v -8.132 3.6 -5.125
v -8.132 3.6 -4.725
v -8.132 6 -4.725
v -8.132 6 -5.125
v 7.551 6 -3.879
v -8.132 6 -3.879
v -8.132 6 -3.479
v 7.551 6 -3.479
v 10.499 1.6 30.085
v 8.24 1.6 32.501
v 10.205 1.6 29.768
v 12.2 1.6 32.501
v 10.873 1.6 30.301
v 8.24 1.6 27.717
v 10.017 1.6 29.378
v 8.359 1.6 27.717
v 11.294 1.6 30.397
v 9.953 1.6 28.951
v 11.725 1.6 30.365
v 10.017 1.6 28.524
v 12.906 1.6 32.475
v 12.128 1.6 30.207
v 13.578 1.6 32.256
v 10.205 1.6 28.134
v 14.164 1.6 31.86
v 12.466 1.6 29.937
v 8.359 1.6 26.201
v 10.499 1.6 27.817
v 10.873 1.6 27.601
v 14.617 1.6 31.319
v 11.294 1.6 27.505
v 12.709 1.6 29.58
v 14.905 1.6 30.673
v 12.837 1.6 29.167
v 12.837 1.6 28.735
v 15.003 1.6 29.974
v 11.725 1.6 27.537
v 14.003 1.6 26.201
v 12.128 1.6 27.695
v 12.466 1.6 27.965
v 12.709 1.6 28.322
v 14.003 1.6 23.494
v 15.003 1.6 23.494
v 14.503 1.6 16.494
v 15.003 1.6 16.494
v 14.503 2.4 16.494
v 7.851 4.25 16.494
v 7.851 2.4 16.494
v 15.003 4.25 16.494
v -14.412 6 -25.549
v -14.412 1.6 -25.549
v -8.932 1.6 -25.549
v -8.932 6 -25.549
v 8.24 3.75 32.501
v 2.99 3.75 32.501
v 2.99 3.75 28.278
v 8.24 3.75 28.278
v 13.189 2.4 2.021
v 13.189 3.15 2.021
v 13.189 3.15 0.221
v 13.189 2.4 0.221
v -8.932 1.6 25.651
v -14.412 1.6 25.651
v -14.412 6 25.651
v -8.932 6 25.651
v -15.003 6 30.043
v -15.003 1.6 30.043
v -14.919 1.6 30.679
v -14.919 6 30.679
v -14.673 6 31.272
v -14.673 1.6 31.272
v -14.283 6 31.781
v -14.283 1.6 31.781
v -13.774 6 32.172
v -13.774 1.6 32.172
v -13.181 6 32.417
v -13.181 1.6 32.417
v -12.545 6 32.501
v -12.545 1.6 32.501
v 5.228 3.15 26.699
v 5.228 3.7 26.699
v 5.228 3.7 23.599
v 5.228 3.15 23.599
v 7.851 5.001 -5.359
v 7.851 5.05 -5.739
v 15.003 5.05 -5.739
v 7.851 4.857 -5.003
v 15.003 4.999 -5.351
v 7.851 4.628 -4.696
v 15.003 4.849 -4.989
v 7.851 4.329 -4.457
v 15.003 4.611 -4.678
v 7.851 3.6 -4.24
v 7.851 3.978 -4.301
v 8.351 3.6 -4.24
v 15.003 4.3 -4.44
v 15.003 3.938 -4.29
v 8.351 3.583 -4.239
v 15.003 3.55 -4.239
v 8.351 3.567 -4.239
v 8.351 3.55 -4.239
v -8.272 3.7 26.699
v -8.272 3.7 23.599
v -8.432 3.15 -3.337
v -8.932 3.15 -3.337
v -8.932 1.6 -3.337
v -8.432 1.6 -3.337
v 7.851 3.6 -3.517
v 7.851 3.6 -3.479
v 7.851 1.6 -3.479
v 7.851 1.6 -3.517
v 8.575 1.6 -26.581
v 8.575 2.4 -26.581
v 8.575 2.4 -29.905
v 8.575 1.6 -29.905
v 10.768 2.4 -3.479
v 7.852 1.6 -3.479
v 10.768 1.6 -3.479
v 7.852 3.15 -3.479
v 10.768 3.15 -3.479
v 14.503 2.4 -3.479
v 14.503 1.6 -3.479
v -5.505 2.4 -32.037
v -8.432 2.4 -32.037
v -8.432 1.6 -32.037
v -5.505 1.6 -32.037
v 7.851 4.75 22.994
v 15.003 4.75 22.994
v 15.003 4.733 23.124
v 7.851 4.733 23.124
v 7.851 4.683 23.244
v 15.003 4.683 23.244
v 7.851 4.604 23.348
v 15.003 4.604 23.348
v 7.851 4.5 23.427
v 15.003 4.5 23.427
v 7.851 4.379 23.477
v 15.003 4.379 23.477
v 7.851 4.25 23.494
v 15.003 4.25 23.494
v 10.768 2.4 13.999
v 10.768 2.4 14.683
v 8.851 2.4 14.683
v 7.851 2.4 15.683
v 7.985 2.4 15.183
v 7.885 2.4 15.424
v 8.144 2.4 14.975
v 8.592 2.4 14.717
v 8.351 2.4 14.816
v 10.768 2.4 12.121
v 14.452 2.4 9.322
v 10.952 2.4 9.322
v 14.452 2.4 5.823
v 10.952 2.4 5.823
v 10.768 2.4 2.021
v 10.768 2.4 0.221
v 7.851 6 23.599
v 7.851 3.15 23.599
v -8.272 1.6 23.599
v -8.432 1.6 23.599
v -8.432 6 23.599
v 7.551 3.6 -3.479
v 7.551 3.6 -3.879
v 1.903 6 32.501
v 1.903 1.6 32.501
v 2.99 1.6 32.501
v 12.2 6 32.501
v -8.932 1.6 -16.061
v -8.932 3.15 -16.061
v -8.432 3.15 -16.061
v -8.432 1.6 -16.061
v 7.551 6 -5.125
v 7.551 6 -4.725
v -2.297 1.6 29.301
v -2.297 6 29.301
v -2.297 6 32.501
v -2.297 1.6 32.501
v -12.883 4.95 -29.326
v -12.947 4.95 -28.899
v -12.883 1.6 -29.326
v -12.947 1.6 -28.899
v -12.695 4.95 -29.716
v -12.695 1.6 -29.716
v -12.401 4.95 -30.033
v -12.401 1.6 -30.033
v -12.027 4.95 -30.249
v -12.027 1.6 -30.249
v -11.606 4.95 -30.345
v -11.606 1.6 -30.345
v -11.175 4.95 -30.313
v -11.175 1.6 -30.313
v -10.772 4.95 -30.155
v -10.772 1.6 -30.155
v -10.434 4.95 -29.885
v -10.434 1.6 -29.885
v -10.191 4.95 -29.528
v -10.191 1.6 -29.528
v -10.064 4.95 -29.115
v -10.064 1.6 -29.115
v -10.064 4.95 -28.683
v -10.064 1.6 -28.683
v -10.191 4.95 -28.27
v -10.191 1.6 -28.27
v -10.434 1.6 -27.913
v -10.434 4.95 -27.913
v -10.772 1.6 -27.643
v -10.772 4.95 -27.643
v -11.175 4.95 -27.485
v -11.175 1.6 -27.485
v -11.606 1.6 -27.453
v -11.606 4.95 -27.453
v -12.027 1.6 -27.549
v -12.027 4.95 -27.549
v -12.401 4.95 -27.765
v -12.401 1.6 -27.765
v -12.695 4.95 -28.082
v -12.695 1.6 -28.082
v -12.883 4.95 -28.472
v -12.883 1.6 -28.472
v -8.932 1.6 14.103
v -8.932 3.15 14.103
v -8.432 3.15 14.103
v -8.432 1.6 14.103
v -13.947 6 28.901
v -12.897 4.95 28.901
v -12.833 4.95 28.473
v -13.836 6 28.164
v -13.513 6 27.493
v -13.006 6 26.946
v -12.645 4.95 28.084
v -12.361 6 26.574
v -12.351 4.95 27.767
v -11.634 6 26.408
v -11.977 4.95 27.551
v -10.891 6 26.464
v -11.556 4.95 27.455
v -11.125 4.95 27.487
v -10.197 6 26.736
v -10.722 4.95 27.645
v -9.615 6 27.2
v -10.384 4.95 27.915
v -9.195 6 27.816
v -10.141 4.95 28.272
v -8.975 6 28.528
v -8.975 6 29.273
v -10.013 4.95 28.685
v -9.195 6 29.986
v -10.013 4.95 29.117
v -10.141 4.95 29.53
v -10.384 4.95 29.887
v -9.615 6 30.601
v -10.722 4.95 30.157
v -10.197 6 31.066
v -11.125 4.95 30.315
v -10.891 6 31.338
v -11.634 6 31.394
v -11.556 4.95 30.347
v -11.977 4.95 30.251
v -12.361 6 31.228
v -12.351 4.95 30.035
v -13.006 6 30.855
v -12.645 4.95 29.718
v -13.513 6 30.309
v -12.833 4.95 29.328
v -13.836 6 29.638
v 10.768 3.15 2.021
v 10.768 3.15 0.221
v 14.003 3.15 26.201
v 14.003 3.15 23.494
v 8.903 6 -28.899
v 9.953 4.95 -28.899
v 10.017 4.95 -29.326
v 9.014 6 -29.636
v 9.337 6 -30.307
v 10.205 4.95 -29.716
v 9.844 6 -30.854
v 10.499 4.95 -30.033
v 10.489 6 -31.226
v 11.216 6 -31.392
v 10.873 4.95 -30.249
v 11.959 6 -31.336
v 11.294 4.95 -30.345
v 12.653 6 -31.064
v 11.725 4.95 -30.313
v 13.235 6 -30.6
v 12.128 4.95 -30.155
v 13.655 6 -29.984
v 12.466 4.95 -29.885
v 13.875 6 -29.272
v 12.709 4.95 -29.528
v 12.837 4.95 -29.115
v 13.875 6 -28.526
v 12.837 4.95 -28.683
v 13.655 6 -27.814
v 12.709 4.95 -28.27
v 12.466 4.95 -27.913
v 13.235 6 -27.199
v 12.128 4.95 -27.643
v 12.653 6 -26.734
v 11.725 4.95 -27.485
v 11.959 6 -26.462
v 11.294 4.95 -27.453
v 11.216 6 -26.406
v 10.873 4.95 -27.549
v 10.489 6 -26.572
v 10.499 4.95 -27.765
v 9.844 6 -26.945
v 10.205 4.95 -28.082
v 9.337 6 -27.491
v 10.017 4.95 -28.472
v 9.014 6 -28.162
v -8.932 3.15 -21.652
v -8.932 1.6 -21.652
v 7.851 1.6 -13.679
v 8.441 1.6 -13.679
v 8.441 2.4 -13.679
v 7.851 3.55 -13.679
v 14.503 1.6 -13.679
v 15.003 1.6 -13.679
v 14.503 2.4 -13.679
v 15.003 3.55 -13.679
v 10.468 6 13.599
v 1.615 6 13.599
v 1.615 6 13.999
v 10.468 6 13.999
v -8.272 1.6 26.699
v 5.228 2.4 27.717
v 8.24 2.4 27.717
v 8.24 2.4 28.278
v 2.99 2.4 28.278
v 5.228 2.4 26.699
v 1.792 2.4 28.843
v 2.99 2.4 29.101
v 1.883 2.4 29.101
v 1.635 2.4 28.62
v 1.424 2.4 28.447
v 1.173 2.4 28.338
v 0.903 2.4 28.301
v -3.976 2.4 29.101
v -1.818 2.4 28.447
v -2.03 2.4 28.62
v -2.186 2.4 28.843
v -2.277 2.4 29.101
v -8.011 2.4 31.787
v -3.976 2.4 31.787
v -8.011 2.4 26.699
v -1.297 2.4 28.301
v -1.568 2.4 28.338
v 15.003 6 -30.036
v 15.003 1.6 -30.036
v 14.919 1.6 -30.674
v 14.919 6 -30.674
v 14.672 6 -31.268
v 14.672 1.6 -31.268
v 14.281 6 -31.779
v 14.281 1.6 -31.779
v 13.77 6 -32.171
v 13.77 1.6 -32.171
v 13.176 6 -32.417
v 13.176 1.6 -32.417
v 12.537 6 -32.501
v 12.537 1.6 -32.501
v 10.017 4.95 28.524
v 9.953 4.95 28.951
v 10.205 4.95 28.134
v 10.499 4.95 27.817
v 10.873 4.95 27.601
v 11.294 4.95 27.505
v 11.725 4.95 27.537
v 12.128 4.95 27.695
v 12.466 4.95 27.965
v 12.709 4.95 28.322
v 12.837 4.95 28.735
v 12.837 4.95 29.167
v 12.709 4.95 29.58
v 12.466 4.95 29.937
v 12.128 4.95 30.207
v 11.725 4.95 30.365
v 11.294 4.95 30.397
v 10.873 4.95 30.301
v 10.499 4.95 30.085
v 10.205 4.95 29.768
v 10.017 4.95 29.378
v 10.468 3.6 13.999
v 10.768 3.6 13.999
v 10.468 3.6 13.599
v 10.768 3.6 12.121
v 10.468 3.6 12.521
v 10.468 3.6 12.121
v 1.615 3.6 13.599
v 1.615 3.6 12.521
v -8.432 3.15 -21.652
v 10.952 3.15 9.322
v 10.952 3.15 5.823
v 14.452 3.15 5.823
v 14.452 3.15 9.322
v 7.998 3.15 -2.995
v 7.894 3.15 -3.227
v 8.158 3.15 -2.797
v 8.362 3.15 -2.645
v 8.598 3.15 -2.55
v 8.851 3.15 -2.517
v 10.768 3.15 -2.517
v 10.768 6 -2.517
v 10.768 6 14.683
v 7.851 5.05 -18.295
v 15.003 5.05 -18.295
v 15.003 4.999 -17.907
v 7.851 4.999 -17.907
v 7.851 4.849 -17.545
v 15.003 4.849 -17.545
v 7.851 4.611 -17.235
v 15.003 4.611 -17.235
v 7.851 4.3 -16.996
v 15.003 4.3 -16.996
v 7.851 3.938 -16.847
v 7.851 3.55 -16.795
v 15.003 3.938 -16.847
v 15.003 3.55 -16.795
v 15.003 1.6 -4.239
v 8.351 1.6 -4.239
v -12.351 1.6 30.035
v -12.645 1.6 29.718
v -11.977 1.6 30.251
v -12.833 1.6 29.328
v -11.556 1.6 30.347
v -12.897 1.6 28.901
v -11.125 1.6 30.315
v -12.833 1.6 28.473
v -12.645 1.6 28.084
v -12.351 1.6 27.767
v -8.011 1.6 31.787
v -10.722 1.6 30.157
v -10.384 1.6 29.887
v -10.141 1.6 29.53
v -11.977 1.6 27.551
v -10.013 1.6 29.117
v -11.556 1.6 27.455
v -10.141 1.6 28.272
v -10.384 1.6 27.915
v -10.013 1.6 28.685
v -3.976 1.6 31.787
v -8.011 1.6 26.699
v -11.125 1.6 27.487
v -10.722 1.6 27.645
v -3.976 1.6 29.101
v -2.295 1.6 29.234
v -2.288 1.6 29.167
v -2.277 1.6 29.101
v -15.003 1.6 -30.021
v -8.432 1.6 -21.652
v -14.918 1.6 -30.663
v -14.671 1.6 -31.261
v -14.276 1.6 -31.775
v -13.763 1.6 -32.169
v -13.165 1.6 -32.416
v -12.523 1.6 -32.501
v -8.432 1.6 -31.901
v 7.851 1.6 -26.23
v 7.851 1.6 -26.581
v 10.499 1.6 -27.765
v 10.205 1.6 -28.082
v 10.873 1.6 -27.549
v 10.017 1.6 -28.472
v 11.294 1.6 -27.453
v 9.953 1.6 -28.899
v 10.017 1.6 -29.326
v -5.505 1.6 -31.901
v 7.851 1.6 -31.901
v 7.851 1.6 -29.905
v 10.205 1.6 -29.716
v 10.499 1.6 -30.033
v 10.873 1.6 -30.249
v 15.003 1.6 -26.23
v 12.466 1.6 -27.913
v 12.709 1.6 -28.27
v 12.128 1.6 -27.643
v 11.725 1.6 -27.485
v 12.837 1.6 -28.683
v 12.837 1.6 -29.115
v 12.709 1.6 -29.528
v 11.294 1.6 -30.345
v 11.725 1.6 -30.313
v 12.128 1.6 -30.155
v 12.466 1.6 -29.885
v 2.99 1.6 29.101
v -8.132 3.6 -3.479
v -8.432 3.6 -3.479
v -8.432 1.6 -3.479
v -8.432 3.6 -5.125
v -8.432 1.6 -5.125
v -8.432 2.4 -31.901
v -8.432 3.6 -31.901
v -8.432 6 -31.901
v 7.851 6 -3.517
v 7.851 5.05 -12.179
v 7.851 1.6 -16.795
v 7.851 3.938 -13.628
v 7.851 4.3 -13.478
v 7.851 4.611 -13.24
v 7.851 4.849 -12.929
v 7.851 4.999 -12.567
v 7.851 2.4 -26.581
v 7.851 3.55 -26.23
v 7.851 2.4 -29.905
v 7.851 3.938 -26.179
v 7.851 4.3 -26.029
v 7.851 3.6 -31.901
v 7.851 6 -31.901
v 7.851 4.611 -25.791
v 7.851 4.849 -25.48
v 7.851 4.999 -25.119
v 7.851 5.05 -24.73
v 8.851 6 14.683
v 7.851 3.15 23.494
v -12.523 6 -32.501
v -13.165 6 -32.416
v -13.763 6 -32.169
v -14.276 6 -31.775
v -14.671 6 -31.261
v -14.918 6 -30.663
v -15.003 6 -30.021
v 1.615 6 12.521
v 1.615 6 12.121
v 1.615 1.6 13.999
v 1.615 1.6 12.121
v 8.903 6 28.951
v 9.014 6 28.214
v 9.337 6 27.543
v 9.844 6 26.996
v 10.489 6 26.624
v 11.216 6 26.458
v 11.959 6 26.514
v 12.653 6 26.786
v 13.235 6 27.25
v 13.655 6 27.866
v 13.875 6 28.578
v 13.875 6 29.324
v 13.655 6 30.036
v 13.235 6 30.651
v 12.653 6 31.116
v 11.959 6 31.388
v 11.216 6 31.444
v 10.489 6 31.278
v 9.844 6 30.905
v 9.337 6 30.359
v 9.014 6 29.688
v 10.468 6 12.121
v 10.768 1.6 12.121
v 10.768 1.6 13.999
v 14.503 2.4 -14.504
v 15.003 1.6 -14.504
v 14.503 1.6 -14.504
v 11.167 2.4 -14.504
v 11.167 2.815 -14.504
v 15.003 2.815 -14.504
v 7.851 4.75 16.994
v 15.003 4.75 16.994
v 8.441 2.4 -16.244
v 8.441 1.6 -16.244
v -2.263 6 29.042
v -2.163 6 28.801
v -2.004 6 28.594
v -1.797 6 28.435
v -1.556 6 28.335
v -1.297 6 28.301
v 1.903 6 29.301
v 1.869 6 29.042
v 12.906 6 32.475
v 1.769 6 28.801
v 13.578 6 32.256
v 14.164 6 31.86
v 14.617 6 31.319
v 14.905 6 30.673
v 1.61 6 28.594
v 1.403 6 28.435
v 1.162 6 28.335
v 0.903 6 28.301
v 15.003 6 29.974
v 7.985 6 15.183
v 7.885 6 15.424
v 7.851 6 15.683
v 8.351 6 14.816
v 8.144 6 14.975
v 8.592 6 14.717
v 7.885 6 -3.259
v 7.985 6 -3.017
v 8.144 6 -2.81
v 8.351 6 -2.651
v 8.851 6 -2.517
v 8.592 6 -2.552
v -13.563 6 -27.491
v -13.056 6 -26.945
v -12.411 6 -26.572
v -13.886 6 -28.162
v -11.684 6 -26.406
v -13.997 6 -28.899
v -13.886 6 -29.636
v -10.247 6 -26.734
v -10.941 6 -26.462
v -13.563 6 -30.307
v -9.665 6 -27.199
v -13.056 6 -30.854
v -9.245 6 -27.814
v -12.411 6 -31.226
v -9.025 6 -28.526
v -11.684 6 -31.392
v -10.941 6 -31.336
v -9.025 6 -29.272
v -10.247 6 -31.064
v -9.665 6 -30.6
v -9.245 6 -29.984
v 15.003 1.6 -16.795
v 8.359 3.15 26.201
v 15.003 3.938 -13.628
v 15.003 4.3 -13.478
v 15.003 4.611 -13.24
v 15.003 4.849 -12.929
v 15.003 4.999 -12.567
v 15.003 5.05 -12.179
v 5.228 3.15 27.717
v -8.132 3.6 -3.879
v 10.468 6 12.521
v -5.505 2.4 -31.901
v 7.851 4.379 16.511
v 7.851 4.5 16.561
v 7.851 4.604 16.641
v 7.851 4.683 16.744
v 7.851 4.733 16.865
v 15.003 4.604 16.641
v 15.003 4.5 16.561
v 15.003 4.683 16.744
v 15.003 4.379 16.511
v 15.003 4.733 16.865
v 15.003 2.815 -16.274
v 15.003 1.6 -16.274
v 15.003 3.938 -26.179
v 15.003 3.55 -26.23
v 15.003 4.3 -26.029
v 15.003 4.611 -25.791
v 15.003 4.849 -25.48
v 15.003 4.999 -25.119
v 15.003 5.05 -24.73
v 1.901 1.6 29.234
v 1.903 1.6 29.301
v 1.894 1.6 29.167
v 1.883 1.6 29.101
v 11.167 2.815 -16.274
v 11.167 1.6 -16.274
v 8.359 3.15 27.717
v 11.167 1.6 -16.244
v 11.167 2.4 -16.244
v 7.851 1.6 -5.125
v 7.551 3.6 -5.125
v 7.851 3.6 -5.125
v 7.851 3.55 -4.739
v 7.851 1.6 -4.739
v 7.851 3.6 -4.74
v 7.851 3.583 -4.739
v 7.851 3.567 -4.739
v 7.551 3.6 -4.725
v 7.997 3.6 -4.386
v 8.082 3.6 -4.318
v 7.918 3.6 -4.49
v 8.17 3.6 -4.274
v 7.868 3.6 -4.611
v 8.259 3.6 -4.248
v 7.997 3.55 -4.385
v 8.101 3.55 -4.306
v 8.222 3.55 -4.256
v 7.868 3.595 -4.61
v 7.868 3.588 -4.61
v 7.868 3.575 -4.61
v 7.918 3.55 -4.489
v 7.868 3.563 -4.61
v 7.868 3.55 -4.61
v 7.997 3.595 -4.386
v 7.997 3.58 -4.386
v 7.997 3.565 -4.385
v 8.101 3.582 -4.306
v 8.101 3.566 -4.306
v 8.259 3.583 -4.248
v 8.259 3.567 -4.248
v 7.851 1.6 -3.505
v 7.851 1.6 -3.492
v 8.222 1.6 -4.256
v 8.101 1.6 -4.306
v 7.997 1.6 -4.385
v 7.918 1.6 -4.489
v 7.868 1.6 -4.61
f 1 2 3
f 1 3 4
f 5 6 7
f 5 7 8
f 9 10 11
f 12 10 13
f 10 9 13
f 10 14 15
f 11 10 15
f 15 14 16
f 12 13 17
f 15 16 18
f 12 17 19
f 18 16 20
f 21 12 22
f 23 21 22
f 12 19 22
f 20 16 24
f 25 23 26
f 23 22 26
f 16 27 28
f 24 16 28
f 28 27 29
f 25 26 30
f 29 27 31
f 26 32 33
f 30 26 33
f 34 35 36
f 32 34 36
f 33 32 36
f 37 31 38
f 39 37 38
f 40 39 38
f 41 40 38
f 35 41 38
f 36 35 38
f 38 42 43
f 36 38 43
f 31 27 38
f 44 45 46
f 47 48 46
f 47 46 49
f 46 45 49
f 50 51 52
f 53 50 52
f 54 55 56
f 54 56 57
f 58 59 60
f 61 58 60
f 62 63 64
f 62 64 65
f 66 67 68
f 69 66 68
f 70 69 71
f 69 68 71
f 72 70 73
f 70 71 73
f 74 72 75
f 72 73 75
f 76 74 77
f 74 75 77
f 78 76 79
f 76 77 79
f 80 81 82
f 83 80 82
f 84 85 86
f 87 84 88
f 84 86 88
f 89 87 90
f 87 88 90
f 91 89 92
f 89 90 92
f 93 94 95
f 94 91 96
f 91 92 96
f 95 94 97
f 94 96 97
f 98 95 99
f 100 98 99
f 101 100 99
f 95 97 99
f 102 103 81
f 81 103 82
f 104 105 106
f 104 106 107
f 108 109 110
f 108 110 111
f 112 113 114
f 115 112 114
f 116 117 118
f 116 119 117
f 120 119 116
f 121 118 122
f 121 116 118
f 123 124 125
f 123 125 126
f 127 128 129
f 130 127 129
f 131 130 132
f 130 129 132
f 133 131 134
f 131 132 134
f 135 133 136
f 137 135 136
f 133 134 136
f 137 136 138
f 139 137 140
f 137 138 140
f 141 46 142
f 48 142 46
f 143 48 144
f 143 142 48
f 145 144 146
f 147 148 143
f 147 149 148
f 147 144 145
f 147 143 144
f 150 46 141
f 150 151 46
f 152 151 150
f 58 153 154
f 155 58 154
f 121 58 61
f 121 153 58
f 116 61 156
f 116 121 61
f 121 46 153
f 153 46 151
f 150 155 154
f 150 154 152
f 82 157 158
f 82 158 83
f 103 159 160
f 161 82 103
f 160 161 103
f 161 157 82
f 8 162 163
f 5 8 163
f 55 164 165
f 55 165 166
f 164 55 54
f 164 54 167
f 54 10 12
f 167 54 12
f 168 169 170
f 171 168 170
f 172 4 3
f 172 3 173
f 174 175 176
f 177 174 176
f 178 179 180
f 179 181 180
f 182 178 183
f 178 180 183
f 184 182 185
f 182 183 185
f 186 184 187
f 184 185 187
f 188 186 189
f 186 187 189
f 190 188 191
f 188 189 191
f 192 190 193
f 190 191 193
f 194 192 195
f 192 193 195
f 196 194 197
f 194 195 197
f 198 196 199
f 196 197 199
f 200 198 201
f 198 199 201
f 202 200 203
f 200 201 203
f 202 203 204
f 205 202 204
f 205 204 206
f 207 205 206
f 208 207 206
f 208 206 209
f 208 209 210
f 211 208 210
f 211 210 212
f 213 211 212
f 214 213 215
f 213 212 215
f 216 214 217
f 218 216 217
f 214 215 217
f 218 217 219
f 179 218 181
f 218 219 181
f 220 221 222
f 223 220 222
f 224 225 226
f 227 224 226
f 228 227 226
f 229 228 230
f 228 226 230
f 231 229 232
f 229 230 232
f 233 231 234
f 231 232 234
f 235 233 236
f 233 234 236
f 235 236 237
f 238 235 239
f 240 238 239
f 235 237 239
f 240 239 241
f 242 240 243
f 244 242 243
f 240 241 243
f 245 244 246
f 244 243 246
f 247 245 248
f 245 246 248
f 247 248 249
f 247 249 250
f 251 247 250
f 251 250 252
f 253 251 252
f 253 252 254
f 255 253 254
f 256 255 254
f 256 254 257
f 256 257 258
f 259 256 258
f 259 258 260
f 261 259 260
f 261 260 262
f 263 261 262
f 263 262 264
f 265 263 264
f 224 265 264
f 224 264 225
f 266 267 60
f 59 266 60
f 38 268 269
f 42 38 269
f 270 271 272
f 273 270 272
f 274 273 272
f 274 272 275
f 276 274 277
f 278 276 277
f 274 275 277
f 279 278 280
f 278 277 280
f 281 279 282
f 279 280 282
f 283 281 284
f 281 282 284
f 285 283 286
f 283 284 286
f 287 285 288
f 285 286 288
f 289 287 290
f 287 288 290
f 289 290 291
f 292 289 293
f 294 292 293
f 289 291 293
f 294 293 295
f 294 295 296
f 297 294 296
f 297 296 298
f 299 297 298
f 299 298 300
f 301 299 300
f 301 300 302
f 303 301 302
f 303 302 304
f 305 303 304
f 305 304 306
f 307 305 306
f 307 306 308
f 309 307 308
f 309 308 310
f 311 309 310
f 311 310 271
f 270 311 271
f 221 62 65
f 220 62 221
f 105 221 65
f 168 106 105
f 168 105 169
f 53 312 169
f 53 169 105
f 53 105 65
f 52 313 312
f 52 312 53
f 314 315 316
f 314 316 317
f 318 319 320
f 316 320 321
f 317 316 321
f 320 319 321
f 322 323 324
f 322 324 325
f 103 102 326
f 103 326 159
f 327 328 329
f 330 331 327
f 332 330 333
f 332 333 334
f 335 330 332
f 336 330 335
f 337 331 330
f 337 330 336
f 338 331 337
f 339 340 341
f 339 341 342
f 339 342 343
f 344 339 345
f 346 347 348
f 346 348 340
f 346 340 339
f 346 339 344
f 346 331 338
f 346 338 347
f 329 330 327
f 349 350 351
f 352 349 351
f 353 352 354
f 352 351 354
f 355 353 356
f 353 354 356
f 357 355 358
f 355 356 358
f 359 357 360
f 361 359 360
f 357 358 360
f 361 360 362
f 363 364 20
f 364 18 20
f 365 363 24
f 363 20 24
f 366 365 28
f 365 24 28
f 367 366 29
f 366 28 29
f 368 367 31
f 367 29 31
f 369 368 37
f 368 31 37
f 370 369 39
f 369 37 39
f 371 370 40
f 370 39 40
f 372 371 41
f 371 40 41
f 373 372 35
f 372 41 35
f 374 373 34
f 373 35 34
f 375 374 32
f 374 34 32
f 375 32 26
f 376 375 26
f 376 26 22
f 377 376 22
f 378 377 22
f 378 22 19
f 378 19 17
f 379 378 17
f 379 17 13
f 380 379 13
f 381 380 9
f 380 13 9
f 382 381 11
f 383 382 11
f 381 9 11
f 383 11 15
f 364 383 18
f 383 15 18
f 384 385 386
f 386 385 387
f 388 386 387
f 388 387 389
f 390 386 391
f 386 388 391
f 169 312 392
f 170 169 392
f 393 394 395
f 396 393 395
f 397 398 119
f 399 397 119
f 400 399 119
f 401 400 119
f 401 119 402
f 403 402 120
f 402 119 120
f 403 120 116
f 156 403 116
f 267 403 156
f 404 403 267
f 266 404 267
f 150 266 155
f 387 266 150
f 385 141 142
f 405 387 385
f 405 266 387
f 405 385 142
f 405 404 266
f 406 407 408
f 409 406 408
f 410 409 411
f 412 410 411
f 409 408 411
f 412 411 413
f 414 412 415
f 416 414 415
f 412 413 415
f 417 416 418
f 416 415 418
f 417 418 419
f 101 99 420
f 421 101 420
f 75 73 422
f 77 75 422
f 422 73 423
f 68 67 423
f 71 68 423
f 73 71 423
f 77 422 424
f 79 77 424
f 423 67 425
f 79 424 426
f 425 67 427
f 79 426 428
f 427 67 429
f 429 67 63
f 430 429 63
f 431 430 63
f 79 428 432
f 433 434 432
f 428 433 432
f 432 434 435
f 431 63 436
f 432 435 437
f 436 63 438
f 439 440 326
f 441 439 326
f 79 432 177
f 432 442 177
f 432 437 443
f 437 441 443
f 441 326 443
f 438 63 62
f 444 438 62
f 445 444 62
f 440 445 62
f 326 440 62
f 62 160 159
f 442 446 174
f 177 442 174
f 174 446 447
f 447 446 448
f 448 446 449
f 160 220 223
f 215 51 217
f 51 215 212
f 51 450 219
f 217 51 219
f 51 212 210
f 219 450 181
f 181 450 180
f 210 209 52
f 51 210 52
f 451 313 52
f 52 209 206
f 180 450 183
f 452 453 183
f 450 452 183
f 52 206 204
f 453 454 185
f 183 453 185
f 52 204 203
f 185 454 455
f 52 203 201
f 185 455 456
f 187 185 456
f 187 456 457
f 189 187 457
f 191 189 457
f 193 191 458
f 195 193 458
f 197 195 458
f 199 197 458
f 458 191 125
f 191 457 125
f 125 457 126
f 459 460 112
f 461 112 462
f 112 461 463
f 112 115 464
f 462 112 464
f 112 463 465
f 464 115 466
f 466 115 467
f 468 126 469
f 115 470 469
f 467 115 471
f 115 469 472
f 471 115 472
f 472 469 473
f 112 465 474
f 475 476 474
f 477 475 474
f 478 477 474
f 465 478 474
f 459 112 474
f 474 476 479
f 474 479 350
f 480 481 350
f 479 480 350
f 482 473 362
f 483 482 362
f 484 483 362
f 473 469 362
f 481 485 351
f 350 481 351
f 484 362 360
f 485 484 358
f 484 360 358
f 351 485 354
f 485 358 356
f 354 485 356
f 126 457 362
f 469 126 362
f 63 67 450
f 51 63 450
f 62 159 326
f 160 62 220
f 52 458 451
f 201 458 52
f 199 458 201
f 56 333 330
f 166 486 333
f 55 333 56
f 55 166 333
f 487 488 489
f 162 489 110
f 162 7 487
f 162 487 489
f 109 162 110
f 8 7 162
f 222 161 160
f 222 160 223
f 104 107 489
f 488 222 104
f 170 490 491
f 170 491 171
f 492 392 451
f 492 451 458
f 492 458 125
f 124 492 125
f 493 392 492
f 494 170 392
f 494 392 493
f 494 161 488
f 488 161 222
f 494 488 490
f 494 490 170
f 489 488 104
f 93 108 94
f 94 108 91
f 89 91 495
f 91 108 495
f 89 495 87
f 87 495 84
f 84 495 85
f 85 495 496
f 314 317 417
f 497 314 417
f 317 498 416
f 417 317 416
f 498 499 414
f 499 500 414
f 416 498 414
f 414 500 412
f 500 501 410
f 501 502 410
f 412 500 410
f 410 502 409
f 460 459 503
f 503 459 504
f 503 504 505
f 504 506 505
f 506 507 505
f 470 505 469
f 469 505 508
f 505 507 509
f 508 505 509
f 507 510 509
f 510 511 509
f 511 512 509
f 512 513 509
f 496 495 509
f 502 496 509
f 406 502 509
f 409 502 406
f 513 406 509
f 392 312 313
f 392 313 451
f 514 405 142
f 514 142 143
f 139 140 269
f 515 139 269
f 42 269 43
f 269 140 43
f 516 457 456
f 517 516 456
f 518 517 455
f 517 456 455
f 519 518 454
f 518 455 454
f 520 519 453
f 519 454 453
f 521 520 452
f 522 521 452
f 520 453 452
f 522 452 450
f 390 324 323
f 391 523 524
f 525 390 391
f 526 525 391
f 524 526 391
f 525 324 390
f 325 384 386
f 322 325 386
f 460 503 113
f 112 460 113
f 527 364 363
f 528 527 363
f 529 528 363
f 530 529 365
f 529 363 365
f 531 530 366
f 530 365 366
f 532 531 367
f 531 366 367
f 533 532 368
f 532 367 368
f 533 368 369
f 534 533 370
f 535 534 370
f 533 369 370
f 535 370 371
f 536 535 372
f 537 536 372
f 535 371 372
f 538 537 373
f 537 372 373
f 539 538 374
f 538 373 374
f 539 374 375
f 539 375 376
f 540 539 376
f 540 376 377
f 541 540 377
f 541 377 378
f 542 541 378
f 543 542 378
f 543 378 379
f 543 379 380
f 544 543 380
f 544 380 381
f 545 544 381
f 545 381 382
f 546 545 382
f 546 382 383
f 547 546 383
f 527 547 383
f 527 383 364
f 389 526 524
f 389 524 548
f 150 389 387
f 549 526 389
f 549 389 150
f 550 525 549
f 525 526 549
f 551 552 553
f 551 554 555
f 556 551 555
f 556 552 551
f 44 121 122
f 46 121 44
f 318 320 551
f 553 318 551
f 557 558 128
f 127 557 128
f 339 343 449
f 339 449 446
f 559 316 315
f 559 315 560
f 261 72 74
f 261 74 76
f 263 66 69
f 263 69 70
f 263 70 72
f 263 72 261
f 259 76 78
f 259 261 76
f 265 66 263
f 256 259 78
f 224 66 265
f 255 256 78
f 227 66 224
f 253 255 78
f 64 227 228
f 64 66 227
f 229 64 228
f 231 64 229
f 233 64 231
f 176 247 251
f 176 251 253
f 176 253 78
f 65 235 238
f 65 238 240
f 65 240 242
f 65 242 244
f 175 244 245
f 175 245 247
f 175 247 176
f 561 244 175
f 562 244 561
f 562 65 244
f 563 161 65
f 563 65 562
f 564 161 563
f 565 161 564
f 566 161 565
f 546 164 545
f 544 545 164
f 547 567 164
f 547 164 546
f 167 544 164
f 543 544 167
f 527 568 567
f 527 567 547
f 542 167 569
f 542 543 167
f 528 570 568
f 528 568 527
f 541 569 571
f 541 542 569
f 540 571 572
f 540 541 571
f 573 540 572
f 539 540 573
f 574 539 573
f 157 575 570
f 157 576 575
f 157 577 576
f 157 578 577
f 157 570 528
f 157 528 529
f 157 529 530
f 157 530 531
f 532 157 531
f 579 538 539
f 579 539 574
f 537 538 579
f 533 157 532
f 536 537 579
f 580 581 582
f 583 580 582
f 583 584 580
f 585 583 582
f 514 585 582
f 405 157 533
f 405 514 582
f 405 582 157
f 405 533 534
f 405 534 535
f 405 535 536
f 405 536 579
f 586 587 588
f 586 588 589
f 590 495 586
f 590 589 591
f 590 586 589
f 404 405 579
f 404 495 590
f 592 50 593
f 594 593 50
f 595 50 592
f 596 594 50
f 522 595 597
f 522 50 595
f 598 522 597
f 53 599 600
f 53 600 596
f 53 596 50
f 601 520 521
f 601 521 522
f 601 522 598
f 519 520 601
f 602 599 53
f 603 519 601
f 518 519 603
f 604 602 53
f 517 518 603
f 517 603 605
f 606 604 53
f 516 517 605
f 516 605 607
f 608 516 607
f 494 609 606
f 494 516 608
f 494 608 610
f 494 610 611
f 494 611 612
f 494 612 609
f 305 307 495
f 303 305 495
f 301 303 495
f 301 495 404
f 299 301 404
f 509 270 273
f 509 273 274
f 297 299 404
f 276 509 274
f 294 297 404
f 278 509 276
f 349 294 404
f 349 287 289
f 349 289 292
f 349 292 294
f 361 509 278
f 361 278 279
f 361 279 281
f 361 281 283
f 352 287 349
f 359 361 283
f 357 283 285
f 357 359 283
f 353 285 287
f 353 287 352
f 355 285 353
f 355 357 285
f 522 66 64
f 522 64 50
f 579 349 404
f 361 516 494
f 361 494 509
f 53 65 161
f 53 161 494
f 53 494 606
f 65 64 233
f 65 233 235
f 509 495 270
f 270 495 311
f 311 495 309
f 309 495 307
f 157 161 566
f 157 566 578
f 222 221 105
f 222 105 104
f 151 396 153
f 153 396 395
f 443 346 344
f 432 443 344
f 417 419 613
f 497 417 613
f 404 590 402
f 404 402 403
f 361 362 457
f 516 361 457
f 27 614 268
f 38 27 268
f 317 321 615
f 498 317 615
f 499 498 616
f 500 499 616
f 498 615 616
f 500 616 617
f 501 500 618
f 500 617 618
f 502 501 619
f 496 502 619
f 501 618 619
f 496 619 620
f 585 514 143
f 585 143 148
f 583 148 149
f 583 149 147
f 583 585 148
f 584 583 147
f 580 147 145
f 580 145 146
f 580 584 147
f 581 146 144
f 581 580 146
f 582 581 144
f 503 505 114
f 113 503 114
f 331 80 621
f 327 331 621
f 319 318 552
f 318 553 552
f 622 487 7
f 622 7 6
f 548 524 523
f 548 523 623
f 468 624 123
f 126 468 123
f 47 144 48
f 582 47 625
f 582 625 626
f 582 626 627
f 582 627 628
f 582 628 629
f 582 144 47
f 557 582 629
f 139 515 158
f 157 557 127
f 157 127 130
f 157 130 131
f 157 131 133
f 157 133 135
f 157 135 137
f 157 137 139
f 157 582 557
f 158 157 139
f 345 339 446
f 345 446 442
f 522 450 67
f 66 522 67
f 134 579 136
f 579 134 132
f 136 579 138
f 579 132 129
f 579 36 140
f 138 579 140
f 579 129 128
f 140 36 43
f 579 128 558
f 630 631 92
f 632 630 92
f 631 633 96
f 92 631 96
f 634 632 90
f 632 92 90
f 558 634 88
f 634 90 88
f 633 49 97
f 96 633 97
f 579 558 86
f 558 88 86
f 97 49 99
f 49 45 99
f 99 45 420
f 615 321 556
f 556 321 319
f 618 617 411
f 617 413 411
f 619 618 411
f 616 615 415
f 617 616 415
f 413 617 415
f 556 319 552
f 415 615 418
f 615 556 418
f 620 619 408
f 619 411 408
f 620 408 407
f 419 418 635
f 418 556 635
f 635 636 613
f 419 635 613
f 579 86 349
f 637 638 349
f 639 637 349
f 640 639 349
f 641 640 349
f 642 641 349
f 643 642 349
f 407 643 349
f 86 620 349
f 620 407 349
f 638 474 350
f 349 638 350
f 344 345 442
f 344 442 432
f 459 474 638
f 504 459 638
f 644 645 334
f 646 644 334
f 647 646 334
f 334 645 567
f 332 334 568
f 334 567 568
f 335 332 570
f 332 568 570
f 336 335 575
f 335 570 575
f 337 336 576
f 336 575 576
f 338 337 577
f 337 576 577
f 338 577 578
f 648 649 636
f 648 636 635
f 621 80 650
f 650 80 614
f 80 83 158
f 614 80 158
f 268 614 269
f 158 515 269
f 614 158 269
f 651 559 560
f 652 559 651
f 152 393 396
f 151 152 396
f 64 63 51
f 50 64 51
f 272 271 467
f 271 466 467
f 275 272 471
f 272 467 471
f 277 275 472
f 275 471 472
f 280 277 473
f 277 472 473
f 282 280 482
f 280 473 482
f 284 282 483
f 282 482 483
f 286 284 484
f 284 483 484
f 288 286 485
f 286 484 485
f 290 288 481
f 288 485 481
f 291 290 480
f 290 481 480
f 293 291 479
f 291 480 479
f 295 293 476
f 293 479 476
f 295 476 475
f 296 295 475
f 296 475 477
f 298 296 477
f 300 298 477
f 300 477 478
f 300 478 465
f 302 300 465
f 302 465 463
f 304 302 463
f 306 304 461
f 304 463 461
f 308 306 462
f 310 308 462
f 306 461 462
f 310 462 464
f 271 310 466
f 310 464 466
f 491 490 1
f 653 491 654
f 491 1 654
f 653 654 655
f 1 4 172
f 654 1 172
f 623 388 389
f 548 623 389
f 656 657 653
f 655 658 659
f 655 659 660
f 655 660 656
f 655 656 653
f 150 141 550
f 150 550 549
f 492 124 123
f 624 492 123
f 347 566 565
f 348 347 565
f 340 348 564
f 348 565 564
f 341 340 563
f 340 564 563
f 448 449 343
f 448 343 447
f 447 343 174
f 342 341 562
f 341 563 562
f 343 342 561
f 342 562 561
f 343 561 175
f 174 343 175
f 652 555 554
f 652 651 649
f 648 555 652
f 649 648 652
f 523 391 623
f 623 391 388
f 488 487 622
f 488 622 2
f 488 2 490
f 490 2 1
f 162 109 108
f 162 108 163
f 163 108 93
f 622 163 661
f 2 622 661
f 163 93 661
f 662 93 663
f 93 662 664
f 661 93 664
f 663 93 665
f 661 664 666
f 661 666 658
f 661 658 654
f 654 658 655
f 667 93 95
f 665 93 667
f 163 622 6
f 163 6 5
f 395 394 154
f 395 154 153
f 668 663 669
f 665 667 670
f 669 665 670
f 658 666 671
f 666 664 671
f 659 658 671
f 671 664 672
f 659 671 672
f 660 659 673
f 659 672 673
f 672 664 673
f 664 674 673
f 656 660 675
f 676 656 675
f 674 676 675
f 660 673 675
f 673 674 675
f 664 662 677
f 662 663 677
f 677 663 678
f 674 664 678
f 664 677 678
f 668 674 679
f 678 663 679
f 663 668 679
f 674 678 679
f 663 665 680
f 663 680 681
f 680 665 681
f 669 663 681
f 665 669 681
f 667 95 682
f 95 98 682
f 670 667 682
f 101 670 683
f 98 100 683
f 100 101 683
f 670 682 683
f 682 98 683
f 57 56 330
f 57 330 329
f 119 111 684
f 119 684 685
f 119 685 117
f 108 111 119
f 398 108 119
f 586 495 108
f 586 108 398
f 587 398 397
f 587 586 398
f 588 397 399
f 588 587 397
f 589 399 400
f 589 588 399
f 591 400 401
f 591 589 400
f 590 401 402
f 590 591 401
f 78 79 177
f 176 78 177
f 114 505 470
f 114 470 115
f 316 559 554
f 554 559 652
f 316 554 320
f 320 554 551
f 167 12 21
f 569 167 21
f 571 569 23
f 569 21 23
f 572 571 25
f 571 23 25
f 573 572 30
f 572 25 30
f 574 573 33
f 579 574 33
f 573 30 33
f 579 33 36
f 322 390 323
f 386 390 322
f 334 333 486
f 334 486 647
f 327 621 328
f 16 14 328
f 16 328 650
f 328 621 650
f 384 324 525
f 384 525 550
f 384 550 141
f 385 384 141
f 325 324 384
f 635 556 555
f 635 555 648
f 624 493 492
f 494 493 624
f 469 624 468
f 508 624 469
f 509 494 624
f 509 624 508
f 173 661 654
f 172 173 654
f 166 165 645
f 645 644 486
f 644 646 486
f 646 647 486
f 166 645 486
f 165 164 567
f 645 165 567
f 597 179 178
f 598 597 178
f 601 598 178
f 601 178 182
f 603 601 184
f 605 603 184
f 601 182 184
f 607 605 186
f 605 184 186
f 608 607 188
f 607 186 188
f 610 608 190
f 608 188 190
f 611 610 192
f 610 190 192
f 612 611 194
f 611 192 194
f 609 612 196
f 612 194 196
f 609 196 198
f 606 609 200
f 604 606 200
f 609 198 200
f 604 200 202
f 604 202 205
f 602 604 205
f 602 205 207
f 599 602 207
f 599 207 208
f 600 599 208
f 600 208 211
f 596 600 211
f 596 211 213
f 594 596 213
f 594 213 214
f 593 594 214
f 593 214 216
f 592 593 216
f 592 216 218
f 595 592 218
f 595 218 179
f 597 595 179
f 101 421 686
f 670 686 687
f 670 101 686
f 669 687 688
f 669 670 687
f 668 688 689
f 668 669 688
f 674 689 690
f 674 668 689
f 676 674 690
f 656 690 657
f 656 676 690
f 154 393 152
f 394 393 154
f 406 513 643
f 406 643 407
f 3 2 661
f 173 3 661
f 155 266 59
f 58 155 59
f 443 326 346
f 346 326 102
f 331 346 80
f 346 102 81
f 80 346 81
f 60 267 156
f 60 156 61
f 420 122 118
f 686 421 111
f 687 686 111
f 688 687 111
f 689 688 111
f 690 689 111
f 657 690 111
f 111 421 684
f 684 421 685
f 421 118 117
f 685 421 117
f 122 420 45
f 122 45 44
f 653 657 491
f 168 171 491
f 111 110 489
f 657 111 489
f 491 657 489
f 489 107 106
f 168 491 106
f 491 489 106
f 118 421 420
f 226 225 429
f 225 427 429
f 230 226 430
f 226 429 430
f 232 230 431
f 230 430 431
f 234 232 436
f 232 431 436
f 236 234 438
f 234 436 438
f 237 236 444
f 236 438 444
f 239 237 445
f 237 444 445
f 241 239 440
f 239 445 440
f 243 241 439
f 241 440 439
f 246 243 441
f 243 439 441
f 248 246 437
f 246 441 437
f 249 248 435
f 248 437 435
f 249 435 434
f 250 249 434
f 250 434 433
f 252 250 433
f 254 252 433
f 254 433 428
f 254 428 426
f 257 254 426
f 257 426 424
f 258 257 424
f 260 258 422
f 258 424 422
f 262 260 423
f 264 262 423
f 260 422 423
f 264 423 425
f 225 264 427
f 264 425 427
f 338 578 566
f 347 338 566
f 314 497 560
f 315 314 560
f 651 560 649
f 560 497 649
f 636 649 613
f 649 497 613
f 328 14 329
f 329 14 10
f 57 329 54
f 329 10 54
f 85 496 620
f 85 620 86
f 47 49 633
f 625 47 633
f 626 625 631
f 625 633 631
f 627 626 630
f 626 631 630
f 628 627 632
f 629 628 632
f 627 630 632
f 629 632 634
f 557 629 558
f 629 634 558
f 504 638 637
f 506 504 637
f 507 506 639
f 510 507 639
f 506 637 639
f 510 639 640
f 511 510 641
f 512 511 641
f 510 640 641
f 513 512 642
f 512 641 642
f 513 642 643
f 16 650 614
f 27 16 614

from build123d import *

# Parameters (mm, degrees)
BOSS_EXTRUDE1_DEPTH                                  = 4.4
CUT_EXTRUDE1_START                                   = 6
CUT_EXTRUDE1_DEPTH                                   = 2.4
CUT_EXTRUDE2_DEPTH                                   = 37.078029775
CUT_EXTRUDE2_DEPTH_BACK                              = 37.078029775
SKETCH3_W                                            = 5.48
SKETCH3_H                                            = 51.2
SKETCH10_W                                           = 16.283333333
SKETCH10_H                                           = 26.775676
CUT_EXTRUDE3_DEPTH                                   = 36.889054494
CUT_EXTRUDE4_DEPTH                                   = 7.151746667
CUT_EXTRUDE5_START                                   = 0.1
SKETCH12_W                                           = 13.500228
SKETCH12_H                                           = 12.700128
CUT_EXTRUDE5_DEPTH                                   = 36.989054494
CUT_EXTRUDE6_START                                   = 0.2
SKETCH13_W                                           = 0.5
SKETCH13_H                                           = 17.440404
SKETCH13_H_2                                         = 5.5901
SKETCH13_W_2                                         = 2.916666667
SKETCH13_H_3                                         = 0.961103333
SKETCH13_W_3                                         = 2.421802
SKETCH13_H_4                                         = 1.8
SKETCH13_W_4                                         = 3.499868
SKETCH13_H_5                                         = 3.499868
CUT_EXTRUDE6_DEPTH                                   = 37.138374093
SKETCH14_W                                           = 5.250054
SKETCH14_H                                           = 2.4
CUT_EXTRUDE7_DEPTH                                   = 4.223132
CUT_EXTRUDE8_DEPTH                                   = 37.078029775
CUT_EXTRUDE9_START                                   = 0.2
SKETCH16_W                                           = 2.927402
SKETCH16_H                                           = 0.136274
SKETCH16_W_2                                         = 0.724468667
SKETCH16_H_2                                         = 3.324
SKETCH16_W_3                                         = 6.061278
SKETCH16_H_3                                         = 2.564974001
CUT_EXTRUDE9_DEPTH                                   = 37.209779678
FILLET1_R                                            = 0.5
SKETCH17_W                                           = 1.77
SKETCH17_H                                           = 1.4652
CUT_EXTRUDE10_DEPTH                                  = 3.835528
SKETCH18_W                                           = 8.852598
SKETCH18_H                                           = 0.4
SKETCH18_W_2                                         = 15.683333333
BOSS_EXTRUDE2_DEPTH                                  = 2.4
CSK_FOR_M2_5_SLOTTED_RAISED_CTSK_HEAD_SC_D           = 2.9
CSK_FOR_M2_5_SLOTTED_RAISED_CTSK_HEAD_SC_CSINK_D     = 5
CSK_FOR_M2_5_SLOTTED_RAISED_CTSK_HEAD_SC_CSINK_ANGLE = 90


with BuildPart() as part:
    # Sketch1 → Boss-Extrude1 (new body)
    with BuildSketch(Plane(origin=(0, 1.6, 0), x_dir=(1, 0, 0), z_dir=(0, 1, 0))):
        with BuildLine():
            Line((-15.002764, 30.021276), (-15.002764, -30.043374))
            ThreePointArc((-15.002764, -30.043374), (-14.282828873, -31.781068474), (-12.54506, -32.500824))
            Line((-12.54506, -32.500824), (12.200382, -32.500824))
            ThreePointArc((12.200382, -32.500824), (14.163585126, -31.860357898), (15.002764, -29.973524))
            Line((15.002764, -29.973524), (15.002764, 30.0355))
            ThreePointArc((15.002764, 30.0355), (14.280687318, 31.778747318), (12.53744, 32.500824))
            Line((12.53744, 32.500824), (-12.522962, 32.500824))
            ThreePointArc((-12.522962, 32.500824), (-14.276432231, 31.77467184), (-15.002764, 30.021276))
        make_face()
    extrude(amount=BOSS_EXTRUDE1_DEPTH)

    # Sketch2 → Cut-Extrude1 (cut)
    with BuildSketch(Plane(origin=(0, 0, 0), x_dir=(1, 0, 0), z_dir=(0, 1, 0)).offset(CUT_EXTRUDE1_START)):
        with BuildLine():
            Line((-8.432316, 31.600824), (-8.432316, 31.900824))
            Line((-8.432316, 31.900824), (7.851017333, 31.900824))
            Line((7.851017333, 31.900824), (7.851017333, 31.600824))
            Line((7.851017333, 31.600824), (7.851017333, 3.517490667))
            ThreePointArc((7.851017333, 3.517490667), (8.143910552, 2.810383885), (8.851017333, 2.517490667))
            Line((8.851017333, 2.517490667), (10.767684, 2.517490667))
            Line((10.767684, 2.517490667), (10.767684, -14.682509333))
            Line((10.767684, -14.682509333), (8.851017333, -14.682509333))
            ThreePointArc((8.851017333, -14.682509333), (8.143910552, -14.975402552), (7.851017333, -15.682509333))
            Line((7.851017333, -15.682509333), (7.851017333, -23.599176))
            Line((7.851017333, -23.599176), (-8.432316, -23.599176))
            Line((-8.432316, -23.599176), (-8.432316, 31.600824))
        make_face()
    extrude(amount=-CUT_EXTRUDE1_DEPTH, mode=Mode.SUBTRACT)

    # Sketch3 → Cut-Extrude2 (cut, two sides: drawn at the far end of the back side and taken through both)
    with BuildSketch(Plane(origin=(0, 6, 0), x_dir=(1, 0, 0), z_dir=(0, 1, 0)).offset(-CUT_EXTRUDE2_DEPTH_BACK)):
        with Locations((-11.672316, -0.0508)):
            Rectangle(SKETCH3_W, SKETCH3_H)
    extrude(amount=CUT_EXTRUDE2_DEPTH + CUT_EXTRUDE2_DEPTH_BACK, mode=Mode.SUBTRACT)

    # Sketch10 → Cut-Extrude3 (cut, through all)
    with BuildSketch(Plane(origin=(0, 3.6, 0), x_dir=(1, 0, 0), z_dir=(0, 1, 0))):
        with Locations((-0.290649333, 18.512986)):
            Rectangle(SKETCH10_W, SKETCH10_H)
        with BuildLine():
            Line((-8.432316, 3.478594), (7.851017333, 3.478594))
            Line((7.851017333, 3.478594), (7.851017333, 3.517490667))
            ThreePointArc((7.851017333, 3.517490667), (8.143910552, 2.810383885), (8.851017333, 2.517490667))
            Line((8.851017333, 2.517490667), (10.767684, 2.517490667))
            Line((10.767684, 2.517490667), (10.767684, -12.121198))
            Line((10.767684, -12.121198), (1.615086, -12.121198))
            Line((1.615086, -12.121198), (1.615086, -13.998638))
            Line((1.615086, -13.998638), (10.767684, -13.998638))
            Line((10.767684, -13.998638), (10.767684, -14.682509333))
            Line((10.767684, -14.682509333), (8.851017333, -14.682509333))
            ThreePointArc((8.851017333, -14.682509333), (8.143910552, -14.975402552), (7.851017333, -15.682509333))
            Line((7.851017333, -15.682509333), (7.851017333, -23.599176))
            Line((7.851017333, -23.599176), (-8.432316, -23.599176))
            Line((-8.432316, -23.599176), (-8.432316, 3.478594))
        make_face()
    extrude(amount=-CUT_EXTRUDE3_DEPTH, mode=Mode.SUBTRACT)

    # Sketch11 → Cut-Extrude4 (cut)
    with BuildSketch(Plane(origin=(15.002764, 0, 0), x_dir=(0, 0, -1), z_dir=(1, 0, 0))):
        with BuildLine():
            Line((-23.494304, 1.6), (-16.494304, 1.6))
            Line((-16.494304, 1.6), (-16.494304, 4.25))
            ThreePointArc((-16.494304, 4.25), (-16.640750609, 4.603553391), (-16.994304, 4.75))
            Line((-16.994304, 4.75), (-22.994304, 4.75))
            ThreePointArc((-22.994304, 4.75), (-23.347857391, 4.603553391), (-23.494304, 4.25))
            Line((-23.494304, 4.25), (-23.494304, 1.6))
        make_face()
        with BuildLine():
            Line((4.238924, 1.6), (13.678923999, 1.6))
            Line((13.678923999, 1.6), (13.678923999, 3.55))
            ThreePointArc((13.678923999, 3.55), (13.239584171, 4.610660172), (12.178923999, 5.05))
            Line((12.178923999, 5.05), (5.738924, 5.05))
            ThreePointArc((5.738924, 5.05), (4.678263828, 4.610660172), (4.238924, 3.55))
            Line((4.238924, 3.55), (4.238924, 1.6))
        make_face()
        with BuildLine():
            Line((16.795424, 1.6), (26.230423999, 1.6))
            Line((26.230423999, 1.6), (26.230423999, 3.55))
            ThreePointArc((26.230423999, 3.55), (25.791084171, 4.610660172), (24.730423999, 5.05))
            Line((24.730423999, 5.05), (18.295424, 5.05))
            ThreePointArc((18.295424, 5.05), (17.234763828, 4.610660172), (16.795424, 3.55))
            Line((16.795424, 3.55), (16.795424, 1.6))
        make_face()
    extrude(amount=-CUT_EXTRUDE4_DEPTH, mode=Mode.SUBTRACT)

    # Sketch12 → Cut-Extrude5 (cut, through all)
    with BuildSketch(Plane(origin=(0, 3.6, 0), x_dir=(1, 0, 0), z_dir=(0, 1, 0)).offset(CUT_EXTRUDE5_START)):
        with Locations((-1.521714, -20.348702)):
            Rectangle(SKETCH12_W, SKETCH12_H)
    extrude(amount=-CUT_EXTRUDE5_DEPTH, mode=Mode.SUBTRACT)

    # Sketch13 → Cut-Extrude6 (cut, through all)
    with BuildSketch(Plane(origin=(0, 2.95, 0), x_dir=(1, 0, 0), z_dir=(0, 1, 0)).offset(CUT_EXTRUDE6_START)):
        with Locations((-8.682316, -5.382704)):
            Rectangle(SKETCH13_W, SKETCH13_H)
        Polygon((8.359486, -27.717306), (8.359486, -26.20092), (14.002764, -26.20092), (14.002764, -23.494304), (8.359486, -23.494304), (5.2284, -23.494304), (5.2284, -27.717306), align=None)
        with Locations((-8.682316, 18.856548)):
            Rectangle(SKETCH13_W, SKETCH13_H_2)
        with Locations((9.309350667, 2.998042333)):
            Rectangle(SKETCH13_W_2, SKETCH13_H_3)
        with Locations((11.978585, -1.120902)):
            Rectangle(SKETCH13_W_3, SKETCH13_H_4)
        with Locations((12.702286, -7.572502)):
            Rectangle(SKETCH13_W_4, SKETCH13_H_5)
    extrude(amount=-CUT_EXTRUDE6_DEPTH, mode=Mode.SUBTRACT)

    # Sketch14 → Cut-Extrude7 (cut)
    with BuildSketch(Plane.XY.offset(32.500824)):
        with Locations((5.615305, 2.55)):
            Rectangle(SKETCH14_W, SKETCH14_H)
    extrude(amount=-CUT_EXTRUDE7_DEPTH, mode=Mode.SUBTRACT)

    # Sketch15 → Cut-Extrude8 (cut, through all)
    with BuildSketch(Plane(origin=(0, 6, 0), x_dir=(1, 0, 0), z_dir=(0, 1, 0))):
        with BuildLine():
            Line((-2.297236, -32.500824), (1.902764, -32.500824))
            Line((1.902764, -32.500824), (1.902764, -29.300824))
            ThreePointArc((1.902764, -29.300824), (1.609870781, -28.593717219), (0.902764, -28.300824))
            Line((0.902764, -28.300824), (-1.297236, -28.300824))
            ThreePointArc((-1.297236, -28.300824), (-2.004342781, -28.593717219), (-2.297236, -29.300824))
            Line((-2.297236, -29.300824), (-2.297236, -32.500824))
        make_face()
    extrude(amount=-CUT_EXTRUDE8_DEPTH, mode=Mode.SUBTRACT)

    # Sketch16 → Cut-Extrude9 (cut, through all)
    with BuildSketch(Plane(origin=(0, 2.2, 0), x_dir=(1, 0, 0), z_dir=(0, 1, 0)).offset(CUT_EXTRUDE9_START)):
        with Locations((-6.968615, 31.968961)):
            Rectangle(SKETCH16_W, SKETCH16_H)
        Polygon((-8.011314, -27.953702), (-8.011314, -26.698766), (8.240332, -26.698766), (8.240332, -29.100824), (-3.976114, -29.100824), (-3.976114, -31.787302), (-8.011314, -31.787302), align=None)
        with Locations((8.213251666, 28.243098)):
            Rectangle(SKETCH16_W_2, SKETCH16_H_2)
        with Locations((11.472125, 14.961410999)):
            Rectangle(SKETCH16_W_3, SKETCH16_H_3)
        Polygon((7.851017333, 3.478594), (14.502764, 3.478594), (14.502764, -16.494304), (7.851017333, -16.494304), (7.851017333, -13.998638), (10.767684, -13.998638), (10.767684, -12.121198), (7.851017333, -12.121198), align=None)
    extrude(amount=-CUT_EXTRUDE9_DEPTH, mode=Mode.SUBTRACT)

    # Fillet1
    # the kernel refuses this fillet: 0.5 mm, written as the material it adds along each edge
    with BuildSketch(Plane(origin=(7.851017333, 3.55, -5.738924), x_dir=(0, 0.762179368611119, 0.6473659012209063), z_dir=(0, 0.6473659012209063, -0.762179368611119))) as fillet1_piece_1_section:
        with BuildLine():
            CenterArc((1.5 - FILLET1_R, FILLET1_R), FILLET1_R, 270, 90)
            Line((1.5, FILLET1_R), (1.5, 0))
            Line((1.5, 0), (1.5 - FILLET1_R, 0))
        make_face()
    fillet1_piece_1 = revolve(axis=Axis((7.851017333, 3.55, -5.738924), (1, 0, 0)), revolution_arc=49.656704737, mode=Mode.PRIVATE)
    fillet1_piece_1 = split(fillet1_piece_1, bisect_by=Plane(origin=(7.962700871, 3.6, -4.350907081), z_dir=(0, -1, 0)), keep=Keep.TOP, mode=Mode.PRIVATE)
    add(fillet1_piece_1)
    with BuildSketch(Plane(origin=(7.851017333, 3.55, -4.238924), x_dir=(1, 0, 0), z_dir=(0, -1, 0))) as fillet1_piece_2:
        with BuildLine():
            CenterArc((FILLET1_R, -FILLET1_R), FILLET1_R, 90, 90)
            Line((0, -FILLET1_R), (0, 0))
            Line((0, 0), (FILLET1_R, 0))
        make_face()
    extrude(amount=1.95)

    # Sketch17 → Cut-Extrude10 (cut)
    with BuildSketch(Plane(origin=(15.002764, 0, 0), x_dir=(0, 0, -1), z_dir=(1, 0, 0))):
        with Locations((15.389098, 2.0826)):
            Rectangle(SKETCH17_W, SKETCH17_H)
    extrude(amount=-CUT_EXTRUDE10_DEPTH, mode=Mode.SUBTRACT)

    # Sketch18 → Boss-Extrude2 (add)
    with BuildSketch(Plane(origin=(0, 3.6, 0), x_dir=(1, 0, 0), z_dir=(0, 1, 0))):
        with Locations((6.041385, -12.321198)):
            Rectangle(SKETCH18_W, SKETCH18_H)
        with Locations((6.041385, -13.798638)):
            Rectangle(SKETCH18_W, SKETCH18_H)
        with Locations((-0.290649334, 4.925148)):
            Rectangle(SKETCH18_W_2, SKETCH18_H)
        with Locations((-0.290649334, 3.678594)):
            Rectangle(SKETCH18_W_2, SKETCH18_H)
    extrude(amount=BOSS_EXTRUDE2_DEPTH)

    # CSK for M2.5 Slotted raised CTSK head screws1 (through all)
    with Locations(Plane(origin=(0, 6, 0), x_dir=(1, 0, 0), z_dir=(0, 1, 0))):
        with Locations((-11.49731, 28.899104), (11.402822, 28.899104), (-11.447272, -28.900882), (11.402822, -28.95092)):
            CounterSinkHole(CSK_FOR_M2_5_SLOTTED_RAISED_CTSK_HEAD_SC_D / 2, CSK_FOR_M2_5_SLOTTED_RAISED_CTSK_HEAD_SC_CSINK_D / 2, counter_sink_angle=CSK_FOR_M2_5_SLOTTED_RAISED_CTSK_HEAD_SC_CSINK_ANGLE)


solid = part.part
